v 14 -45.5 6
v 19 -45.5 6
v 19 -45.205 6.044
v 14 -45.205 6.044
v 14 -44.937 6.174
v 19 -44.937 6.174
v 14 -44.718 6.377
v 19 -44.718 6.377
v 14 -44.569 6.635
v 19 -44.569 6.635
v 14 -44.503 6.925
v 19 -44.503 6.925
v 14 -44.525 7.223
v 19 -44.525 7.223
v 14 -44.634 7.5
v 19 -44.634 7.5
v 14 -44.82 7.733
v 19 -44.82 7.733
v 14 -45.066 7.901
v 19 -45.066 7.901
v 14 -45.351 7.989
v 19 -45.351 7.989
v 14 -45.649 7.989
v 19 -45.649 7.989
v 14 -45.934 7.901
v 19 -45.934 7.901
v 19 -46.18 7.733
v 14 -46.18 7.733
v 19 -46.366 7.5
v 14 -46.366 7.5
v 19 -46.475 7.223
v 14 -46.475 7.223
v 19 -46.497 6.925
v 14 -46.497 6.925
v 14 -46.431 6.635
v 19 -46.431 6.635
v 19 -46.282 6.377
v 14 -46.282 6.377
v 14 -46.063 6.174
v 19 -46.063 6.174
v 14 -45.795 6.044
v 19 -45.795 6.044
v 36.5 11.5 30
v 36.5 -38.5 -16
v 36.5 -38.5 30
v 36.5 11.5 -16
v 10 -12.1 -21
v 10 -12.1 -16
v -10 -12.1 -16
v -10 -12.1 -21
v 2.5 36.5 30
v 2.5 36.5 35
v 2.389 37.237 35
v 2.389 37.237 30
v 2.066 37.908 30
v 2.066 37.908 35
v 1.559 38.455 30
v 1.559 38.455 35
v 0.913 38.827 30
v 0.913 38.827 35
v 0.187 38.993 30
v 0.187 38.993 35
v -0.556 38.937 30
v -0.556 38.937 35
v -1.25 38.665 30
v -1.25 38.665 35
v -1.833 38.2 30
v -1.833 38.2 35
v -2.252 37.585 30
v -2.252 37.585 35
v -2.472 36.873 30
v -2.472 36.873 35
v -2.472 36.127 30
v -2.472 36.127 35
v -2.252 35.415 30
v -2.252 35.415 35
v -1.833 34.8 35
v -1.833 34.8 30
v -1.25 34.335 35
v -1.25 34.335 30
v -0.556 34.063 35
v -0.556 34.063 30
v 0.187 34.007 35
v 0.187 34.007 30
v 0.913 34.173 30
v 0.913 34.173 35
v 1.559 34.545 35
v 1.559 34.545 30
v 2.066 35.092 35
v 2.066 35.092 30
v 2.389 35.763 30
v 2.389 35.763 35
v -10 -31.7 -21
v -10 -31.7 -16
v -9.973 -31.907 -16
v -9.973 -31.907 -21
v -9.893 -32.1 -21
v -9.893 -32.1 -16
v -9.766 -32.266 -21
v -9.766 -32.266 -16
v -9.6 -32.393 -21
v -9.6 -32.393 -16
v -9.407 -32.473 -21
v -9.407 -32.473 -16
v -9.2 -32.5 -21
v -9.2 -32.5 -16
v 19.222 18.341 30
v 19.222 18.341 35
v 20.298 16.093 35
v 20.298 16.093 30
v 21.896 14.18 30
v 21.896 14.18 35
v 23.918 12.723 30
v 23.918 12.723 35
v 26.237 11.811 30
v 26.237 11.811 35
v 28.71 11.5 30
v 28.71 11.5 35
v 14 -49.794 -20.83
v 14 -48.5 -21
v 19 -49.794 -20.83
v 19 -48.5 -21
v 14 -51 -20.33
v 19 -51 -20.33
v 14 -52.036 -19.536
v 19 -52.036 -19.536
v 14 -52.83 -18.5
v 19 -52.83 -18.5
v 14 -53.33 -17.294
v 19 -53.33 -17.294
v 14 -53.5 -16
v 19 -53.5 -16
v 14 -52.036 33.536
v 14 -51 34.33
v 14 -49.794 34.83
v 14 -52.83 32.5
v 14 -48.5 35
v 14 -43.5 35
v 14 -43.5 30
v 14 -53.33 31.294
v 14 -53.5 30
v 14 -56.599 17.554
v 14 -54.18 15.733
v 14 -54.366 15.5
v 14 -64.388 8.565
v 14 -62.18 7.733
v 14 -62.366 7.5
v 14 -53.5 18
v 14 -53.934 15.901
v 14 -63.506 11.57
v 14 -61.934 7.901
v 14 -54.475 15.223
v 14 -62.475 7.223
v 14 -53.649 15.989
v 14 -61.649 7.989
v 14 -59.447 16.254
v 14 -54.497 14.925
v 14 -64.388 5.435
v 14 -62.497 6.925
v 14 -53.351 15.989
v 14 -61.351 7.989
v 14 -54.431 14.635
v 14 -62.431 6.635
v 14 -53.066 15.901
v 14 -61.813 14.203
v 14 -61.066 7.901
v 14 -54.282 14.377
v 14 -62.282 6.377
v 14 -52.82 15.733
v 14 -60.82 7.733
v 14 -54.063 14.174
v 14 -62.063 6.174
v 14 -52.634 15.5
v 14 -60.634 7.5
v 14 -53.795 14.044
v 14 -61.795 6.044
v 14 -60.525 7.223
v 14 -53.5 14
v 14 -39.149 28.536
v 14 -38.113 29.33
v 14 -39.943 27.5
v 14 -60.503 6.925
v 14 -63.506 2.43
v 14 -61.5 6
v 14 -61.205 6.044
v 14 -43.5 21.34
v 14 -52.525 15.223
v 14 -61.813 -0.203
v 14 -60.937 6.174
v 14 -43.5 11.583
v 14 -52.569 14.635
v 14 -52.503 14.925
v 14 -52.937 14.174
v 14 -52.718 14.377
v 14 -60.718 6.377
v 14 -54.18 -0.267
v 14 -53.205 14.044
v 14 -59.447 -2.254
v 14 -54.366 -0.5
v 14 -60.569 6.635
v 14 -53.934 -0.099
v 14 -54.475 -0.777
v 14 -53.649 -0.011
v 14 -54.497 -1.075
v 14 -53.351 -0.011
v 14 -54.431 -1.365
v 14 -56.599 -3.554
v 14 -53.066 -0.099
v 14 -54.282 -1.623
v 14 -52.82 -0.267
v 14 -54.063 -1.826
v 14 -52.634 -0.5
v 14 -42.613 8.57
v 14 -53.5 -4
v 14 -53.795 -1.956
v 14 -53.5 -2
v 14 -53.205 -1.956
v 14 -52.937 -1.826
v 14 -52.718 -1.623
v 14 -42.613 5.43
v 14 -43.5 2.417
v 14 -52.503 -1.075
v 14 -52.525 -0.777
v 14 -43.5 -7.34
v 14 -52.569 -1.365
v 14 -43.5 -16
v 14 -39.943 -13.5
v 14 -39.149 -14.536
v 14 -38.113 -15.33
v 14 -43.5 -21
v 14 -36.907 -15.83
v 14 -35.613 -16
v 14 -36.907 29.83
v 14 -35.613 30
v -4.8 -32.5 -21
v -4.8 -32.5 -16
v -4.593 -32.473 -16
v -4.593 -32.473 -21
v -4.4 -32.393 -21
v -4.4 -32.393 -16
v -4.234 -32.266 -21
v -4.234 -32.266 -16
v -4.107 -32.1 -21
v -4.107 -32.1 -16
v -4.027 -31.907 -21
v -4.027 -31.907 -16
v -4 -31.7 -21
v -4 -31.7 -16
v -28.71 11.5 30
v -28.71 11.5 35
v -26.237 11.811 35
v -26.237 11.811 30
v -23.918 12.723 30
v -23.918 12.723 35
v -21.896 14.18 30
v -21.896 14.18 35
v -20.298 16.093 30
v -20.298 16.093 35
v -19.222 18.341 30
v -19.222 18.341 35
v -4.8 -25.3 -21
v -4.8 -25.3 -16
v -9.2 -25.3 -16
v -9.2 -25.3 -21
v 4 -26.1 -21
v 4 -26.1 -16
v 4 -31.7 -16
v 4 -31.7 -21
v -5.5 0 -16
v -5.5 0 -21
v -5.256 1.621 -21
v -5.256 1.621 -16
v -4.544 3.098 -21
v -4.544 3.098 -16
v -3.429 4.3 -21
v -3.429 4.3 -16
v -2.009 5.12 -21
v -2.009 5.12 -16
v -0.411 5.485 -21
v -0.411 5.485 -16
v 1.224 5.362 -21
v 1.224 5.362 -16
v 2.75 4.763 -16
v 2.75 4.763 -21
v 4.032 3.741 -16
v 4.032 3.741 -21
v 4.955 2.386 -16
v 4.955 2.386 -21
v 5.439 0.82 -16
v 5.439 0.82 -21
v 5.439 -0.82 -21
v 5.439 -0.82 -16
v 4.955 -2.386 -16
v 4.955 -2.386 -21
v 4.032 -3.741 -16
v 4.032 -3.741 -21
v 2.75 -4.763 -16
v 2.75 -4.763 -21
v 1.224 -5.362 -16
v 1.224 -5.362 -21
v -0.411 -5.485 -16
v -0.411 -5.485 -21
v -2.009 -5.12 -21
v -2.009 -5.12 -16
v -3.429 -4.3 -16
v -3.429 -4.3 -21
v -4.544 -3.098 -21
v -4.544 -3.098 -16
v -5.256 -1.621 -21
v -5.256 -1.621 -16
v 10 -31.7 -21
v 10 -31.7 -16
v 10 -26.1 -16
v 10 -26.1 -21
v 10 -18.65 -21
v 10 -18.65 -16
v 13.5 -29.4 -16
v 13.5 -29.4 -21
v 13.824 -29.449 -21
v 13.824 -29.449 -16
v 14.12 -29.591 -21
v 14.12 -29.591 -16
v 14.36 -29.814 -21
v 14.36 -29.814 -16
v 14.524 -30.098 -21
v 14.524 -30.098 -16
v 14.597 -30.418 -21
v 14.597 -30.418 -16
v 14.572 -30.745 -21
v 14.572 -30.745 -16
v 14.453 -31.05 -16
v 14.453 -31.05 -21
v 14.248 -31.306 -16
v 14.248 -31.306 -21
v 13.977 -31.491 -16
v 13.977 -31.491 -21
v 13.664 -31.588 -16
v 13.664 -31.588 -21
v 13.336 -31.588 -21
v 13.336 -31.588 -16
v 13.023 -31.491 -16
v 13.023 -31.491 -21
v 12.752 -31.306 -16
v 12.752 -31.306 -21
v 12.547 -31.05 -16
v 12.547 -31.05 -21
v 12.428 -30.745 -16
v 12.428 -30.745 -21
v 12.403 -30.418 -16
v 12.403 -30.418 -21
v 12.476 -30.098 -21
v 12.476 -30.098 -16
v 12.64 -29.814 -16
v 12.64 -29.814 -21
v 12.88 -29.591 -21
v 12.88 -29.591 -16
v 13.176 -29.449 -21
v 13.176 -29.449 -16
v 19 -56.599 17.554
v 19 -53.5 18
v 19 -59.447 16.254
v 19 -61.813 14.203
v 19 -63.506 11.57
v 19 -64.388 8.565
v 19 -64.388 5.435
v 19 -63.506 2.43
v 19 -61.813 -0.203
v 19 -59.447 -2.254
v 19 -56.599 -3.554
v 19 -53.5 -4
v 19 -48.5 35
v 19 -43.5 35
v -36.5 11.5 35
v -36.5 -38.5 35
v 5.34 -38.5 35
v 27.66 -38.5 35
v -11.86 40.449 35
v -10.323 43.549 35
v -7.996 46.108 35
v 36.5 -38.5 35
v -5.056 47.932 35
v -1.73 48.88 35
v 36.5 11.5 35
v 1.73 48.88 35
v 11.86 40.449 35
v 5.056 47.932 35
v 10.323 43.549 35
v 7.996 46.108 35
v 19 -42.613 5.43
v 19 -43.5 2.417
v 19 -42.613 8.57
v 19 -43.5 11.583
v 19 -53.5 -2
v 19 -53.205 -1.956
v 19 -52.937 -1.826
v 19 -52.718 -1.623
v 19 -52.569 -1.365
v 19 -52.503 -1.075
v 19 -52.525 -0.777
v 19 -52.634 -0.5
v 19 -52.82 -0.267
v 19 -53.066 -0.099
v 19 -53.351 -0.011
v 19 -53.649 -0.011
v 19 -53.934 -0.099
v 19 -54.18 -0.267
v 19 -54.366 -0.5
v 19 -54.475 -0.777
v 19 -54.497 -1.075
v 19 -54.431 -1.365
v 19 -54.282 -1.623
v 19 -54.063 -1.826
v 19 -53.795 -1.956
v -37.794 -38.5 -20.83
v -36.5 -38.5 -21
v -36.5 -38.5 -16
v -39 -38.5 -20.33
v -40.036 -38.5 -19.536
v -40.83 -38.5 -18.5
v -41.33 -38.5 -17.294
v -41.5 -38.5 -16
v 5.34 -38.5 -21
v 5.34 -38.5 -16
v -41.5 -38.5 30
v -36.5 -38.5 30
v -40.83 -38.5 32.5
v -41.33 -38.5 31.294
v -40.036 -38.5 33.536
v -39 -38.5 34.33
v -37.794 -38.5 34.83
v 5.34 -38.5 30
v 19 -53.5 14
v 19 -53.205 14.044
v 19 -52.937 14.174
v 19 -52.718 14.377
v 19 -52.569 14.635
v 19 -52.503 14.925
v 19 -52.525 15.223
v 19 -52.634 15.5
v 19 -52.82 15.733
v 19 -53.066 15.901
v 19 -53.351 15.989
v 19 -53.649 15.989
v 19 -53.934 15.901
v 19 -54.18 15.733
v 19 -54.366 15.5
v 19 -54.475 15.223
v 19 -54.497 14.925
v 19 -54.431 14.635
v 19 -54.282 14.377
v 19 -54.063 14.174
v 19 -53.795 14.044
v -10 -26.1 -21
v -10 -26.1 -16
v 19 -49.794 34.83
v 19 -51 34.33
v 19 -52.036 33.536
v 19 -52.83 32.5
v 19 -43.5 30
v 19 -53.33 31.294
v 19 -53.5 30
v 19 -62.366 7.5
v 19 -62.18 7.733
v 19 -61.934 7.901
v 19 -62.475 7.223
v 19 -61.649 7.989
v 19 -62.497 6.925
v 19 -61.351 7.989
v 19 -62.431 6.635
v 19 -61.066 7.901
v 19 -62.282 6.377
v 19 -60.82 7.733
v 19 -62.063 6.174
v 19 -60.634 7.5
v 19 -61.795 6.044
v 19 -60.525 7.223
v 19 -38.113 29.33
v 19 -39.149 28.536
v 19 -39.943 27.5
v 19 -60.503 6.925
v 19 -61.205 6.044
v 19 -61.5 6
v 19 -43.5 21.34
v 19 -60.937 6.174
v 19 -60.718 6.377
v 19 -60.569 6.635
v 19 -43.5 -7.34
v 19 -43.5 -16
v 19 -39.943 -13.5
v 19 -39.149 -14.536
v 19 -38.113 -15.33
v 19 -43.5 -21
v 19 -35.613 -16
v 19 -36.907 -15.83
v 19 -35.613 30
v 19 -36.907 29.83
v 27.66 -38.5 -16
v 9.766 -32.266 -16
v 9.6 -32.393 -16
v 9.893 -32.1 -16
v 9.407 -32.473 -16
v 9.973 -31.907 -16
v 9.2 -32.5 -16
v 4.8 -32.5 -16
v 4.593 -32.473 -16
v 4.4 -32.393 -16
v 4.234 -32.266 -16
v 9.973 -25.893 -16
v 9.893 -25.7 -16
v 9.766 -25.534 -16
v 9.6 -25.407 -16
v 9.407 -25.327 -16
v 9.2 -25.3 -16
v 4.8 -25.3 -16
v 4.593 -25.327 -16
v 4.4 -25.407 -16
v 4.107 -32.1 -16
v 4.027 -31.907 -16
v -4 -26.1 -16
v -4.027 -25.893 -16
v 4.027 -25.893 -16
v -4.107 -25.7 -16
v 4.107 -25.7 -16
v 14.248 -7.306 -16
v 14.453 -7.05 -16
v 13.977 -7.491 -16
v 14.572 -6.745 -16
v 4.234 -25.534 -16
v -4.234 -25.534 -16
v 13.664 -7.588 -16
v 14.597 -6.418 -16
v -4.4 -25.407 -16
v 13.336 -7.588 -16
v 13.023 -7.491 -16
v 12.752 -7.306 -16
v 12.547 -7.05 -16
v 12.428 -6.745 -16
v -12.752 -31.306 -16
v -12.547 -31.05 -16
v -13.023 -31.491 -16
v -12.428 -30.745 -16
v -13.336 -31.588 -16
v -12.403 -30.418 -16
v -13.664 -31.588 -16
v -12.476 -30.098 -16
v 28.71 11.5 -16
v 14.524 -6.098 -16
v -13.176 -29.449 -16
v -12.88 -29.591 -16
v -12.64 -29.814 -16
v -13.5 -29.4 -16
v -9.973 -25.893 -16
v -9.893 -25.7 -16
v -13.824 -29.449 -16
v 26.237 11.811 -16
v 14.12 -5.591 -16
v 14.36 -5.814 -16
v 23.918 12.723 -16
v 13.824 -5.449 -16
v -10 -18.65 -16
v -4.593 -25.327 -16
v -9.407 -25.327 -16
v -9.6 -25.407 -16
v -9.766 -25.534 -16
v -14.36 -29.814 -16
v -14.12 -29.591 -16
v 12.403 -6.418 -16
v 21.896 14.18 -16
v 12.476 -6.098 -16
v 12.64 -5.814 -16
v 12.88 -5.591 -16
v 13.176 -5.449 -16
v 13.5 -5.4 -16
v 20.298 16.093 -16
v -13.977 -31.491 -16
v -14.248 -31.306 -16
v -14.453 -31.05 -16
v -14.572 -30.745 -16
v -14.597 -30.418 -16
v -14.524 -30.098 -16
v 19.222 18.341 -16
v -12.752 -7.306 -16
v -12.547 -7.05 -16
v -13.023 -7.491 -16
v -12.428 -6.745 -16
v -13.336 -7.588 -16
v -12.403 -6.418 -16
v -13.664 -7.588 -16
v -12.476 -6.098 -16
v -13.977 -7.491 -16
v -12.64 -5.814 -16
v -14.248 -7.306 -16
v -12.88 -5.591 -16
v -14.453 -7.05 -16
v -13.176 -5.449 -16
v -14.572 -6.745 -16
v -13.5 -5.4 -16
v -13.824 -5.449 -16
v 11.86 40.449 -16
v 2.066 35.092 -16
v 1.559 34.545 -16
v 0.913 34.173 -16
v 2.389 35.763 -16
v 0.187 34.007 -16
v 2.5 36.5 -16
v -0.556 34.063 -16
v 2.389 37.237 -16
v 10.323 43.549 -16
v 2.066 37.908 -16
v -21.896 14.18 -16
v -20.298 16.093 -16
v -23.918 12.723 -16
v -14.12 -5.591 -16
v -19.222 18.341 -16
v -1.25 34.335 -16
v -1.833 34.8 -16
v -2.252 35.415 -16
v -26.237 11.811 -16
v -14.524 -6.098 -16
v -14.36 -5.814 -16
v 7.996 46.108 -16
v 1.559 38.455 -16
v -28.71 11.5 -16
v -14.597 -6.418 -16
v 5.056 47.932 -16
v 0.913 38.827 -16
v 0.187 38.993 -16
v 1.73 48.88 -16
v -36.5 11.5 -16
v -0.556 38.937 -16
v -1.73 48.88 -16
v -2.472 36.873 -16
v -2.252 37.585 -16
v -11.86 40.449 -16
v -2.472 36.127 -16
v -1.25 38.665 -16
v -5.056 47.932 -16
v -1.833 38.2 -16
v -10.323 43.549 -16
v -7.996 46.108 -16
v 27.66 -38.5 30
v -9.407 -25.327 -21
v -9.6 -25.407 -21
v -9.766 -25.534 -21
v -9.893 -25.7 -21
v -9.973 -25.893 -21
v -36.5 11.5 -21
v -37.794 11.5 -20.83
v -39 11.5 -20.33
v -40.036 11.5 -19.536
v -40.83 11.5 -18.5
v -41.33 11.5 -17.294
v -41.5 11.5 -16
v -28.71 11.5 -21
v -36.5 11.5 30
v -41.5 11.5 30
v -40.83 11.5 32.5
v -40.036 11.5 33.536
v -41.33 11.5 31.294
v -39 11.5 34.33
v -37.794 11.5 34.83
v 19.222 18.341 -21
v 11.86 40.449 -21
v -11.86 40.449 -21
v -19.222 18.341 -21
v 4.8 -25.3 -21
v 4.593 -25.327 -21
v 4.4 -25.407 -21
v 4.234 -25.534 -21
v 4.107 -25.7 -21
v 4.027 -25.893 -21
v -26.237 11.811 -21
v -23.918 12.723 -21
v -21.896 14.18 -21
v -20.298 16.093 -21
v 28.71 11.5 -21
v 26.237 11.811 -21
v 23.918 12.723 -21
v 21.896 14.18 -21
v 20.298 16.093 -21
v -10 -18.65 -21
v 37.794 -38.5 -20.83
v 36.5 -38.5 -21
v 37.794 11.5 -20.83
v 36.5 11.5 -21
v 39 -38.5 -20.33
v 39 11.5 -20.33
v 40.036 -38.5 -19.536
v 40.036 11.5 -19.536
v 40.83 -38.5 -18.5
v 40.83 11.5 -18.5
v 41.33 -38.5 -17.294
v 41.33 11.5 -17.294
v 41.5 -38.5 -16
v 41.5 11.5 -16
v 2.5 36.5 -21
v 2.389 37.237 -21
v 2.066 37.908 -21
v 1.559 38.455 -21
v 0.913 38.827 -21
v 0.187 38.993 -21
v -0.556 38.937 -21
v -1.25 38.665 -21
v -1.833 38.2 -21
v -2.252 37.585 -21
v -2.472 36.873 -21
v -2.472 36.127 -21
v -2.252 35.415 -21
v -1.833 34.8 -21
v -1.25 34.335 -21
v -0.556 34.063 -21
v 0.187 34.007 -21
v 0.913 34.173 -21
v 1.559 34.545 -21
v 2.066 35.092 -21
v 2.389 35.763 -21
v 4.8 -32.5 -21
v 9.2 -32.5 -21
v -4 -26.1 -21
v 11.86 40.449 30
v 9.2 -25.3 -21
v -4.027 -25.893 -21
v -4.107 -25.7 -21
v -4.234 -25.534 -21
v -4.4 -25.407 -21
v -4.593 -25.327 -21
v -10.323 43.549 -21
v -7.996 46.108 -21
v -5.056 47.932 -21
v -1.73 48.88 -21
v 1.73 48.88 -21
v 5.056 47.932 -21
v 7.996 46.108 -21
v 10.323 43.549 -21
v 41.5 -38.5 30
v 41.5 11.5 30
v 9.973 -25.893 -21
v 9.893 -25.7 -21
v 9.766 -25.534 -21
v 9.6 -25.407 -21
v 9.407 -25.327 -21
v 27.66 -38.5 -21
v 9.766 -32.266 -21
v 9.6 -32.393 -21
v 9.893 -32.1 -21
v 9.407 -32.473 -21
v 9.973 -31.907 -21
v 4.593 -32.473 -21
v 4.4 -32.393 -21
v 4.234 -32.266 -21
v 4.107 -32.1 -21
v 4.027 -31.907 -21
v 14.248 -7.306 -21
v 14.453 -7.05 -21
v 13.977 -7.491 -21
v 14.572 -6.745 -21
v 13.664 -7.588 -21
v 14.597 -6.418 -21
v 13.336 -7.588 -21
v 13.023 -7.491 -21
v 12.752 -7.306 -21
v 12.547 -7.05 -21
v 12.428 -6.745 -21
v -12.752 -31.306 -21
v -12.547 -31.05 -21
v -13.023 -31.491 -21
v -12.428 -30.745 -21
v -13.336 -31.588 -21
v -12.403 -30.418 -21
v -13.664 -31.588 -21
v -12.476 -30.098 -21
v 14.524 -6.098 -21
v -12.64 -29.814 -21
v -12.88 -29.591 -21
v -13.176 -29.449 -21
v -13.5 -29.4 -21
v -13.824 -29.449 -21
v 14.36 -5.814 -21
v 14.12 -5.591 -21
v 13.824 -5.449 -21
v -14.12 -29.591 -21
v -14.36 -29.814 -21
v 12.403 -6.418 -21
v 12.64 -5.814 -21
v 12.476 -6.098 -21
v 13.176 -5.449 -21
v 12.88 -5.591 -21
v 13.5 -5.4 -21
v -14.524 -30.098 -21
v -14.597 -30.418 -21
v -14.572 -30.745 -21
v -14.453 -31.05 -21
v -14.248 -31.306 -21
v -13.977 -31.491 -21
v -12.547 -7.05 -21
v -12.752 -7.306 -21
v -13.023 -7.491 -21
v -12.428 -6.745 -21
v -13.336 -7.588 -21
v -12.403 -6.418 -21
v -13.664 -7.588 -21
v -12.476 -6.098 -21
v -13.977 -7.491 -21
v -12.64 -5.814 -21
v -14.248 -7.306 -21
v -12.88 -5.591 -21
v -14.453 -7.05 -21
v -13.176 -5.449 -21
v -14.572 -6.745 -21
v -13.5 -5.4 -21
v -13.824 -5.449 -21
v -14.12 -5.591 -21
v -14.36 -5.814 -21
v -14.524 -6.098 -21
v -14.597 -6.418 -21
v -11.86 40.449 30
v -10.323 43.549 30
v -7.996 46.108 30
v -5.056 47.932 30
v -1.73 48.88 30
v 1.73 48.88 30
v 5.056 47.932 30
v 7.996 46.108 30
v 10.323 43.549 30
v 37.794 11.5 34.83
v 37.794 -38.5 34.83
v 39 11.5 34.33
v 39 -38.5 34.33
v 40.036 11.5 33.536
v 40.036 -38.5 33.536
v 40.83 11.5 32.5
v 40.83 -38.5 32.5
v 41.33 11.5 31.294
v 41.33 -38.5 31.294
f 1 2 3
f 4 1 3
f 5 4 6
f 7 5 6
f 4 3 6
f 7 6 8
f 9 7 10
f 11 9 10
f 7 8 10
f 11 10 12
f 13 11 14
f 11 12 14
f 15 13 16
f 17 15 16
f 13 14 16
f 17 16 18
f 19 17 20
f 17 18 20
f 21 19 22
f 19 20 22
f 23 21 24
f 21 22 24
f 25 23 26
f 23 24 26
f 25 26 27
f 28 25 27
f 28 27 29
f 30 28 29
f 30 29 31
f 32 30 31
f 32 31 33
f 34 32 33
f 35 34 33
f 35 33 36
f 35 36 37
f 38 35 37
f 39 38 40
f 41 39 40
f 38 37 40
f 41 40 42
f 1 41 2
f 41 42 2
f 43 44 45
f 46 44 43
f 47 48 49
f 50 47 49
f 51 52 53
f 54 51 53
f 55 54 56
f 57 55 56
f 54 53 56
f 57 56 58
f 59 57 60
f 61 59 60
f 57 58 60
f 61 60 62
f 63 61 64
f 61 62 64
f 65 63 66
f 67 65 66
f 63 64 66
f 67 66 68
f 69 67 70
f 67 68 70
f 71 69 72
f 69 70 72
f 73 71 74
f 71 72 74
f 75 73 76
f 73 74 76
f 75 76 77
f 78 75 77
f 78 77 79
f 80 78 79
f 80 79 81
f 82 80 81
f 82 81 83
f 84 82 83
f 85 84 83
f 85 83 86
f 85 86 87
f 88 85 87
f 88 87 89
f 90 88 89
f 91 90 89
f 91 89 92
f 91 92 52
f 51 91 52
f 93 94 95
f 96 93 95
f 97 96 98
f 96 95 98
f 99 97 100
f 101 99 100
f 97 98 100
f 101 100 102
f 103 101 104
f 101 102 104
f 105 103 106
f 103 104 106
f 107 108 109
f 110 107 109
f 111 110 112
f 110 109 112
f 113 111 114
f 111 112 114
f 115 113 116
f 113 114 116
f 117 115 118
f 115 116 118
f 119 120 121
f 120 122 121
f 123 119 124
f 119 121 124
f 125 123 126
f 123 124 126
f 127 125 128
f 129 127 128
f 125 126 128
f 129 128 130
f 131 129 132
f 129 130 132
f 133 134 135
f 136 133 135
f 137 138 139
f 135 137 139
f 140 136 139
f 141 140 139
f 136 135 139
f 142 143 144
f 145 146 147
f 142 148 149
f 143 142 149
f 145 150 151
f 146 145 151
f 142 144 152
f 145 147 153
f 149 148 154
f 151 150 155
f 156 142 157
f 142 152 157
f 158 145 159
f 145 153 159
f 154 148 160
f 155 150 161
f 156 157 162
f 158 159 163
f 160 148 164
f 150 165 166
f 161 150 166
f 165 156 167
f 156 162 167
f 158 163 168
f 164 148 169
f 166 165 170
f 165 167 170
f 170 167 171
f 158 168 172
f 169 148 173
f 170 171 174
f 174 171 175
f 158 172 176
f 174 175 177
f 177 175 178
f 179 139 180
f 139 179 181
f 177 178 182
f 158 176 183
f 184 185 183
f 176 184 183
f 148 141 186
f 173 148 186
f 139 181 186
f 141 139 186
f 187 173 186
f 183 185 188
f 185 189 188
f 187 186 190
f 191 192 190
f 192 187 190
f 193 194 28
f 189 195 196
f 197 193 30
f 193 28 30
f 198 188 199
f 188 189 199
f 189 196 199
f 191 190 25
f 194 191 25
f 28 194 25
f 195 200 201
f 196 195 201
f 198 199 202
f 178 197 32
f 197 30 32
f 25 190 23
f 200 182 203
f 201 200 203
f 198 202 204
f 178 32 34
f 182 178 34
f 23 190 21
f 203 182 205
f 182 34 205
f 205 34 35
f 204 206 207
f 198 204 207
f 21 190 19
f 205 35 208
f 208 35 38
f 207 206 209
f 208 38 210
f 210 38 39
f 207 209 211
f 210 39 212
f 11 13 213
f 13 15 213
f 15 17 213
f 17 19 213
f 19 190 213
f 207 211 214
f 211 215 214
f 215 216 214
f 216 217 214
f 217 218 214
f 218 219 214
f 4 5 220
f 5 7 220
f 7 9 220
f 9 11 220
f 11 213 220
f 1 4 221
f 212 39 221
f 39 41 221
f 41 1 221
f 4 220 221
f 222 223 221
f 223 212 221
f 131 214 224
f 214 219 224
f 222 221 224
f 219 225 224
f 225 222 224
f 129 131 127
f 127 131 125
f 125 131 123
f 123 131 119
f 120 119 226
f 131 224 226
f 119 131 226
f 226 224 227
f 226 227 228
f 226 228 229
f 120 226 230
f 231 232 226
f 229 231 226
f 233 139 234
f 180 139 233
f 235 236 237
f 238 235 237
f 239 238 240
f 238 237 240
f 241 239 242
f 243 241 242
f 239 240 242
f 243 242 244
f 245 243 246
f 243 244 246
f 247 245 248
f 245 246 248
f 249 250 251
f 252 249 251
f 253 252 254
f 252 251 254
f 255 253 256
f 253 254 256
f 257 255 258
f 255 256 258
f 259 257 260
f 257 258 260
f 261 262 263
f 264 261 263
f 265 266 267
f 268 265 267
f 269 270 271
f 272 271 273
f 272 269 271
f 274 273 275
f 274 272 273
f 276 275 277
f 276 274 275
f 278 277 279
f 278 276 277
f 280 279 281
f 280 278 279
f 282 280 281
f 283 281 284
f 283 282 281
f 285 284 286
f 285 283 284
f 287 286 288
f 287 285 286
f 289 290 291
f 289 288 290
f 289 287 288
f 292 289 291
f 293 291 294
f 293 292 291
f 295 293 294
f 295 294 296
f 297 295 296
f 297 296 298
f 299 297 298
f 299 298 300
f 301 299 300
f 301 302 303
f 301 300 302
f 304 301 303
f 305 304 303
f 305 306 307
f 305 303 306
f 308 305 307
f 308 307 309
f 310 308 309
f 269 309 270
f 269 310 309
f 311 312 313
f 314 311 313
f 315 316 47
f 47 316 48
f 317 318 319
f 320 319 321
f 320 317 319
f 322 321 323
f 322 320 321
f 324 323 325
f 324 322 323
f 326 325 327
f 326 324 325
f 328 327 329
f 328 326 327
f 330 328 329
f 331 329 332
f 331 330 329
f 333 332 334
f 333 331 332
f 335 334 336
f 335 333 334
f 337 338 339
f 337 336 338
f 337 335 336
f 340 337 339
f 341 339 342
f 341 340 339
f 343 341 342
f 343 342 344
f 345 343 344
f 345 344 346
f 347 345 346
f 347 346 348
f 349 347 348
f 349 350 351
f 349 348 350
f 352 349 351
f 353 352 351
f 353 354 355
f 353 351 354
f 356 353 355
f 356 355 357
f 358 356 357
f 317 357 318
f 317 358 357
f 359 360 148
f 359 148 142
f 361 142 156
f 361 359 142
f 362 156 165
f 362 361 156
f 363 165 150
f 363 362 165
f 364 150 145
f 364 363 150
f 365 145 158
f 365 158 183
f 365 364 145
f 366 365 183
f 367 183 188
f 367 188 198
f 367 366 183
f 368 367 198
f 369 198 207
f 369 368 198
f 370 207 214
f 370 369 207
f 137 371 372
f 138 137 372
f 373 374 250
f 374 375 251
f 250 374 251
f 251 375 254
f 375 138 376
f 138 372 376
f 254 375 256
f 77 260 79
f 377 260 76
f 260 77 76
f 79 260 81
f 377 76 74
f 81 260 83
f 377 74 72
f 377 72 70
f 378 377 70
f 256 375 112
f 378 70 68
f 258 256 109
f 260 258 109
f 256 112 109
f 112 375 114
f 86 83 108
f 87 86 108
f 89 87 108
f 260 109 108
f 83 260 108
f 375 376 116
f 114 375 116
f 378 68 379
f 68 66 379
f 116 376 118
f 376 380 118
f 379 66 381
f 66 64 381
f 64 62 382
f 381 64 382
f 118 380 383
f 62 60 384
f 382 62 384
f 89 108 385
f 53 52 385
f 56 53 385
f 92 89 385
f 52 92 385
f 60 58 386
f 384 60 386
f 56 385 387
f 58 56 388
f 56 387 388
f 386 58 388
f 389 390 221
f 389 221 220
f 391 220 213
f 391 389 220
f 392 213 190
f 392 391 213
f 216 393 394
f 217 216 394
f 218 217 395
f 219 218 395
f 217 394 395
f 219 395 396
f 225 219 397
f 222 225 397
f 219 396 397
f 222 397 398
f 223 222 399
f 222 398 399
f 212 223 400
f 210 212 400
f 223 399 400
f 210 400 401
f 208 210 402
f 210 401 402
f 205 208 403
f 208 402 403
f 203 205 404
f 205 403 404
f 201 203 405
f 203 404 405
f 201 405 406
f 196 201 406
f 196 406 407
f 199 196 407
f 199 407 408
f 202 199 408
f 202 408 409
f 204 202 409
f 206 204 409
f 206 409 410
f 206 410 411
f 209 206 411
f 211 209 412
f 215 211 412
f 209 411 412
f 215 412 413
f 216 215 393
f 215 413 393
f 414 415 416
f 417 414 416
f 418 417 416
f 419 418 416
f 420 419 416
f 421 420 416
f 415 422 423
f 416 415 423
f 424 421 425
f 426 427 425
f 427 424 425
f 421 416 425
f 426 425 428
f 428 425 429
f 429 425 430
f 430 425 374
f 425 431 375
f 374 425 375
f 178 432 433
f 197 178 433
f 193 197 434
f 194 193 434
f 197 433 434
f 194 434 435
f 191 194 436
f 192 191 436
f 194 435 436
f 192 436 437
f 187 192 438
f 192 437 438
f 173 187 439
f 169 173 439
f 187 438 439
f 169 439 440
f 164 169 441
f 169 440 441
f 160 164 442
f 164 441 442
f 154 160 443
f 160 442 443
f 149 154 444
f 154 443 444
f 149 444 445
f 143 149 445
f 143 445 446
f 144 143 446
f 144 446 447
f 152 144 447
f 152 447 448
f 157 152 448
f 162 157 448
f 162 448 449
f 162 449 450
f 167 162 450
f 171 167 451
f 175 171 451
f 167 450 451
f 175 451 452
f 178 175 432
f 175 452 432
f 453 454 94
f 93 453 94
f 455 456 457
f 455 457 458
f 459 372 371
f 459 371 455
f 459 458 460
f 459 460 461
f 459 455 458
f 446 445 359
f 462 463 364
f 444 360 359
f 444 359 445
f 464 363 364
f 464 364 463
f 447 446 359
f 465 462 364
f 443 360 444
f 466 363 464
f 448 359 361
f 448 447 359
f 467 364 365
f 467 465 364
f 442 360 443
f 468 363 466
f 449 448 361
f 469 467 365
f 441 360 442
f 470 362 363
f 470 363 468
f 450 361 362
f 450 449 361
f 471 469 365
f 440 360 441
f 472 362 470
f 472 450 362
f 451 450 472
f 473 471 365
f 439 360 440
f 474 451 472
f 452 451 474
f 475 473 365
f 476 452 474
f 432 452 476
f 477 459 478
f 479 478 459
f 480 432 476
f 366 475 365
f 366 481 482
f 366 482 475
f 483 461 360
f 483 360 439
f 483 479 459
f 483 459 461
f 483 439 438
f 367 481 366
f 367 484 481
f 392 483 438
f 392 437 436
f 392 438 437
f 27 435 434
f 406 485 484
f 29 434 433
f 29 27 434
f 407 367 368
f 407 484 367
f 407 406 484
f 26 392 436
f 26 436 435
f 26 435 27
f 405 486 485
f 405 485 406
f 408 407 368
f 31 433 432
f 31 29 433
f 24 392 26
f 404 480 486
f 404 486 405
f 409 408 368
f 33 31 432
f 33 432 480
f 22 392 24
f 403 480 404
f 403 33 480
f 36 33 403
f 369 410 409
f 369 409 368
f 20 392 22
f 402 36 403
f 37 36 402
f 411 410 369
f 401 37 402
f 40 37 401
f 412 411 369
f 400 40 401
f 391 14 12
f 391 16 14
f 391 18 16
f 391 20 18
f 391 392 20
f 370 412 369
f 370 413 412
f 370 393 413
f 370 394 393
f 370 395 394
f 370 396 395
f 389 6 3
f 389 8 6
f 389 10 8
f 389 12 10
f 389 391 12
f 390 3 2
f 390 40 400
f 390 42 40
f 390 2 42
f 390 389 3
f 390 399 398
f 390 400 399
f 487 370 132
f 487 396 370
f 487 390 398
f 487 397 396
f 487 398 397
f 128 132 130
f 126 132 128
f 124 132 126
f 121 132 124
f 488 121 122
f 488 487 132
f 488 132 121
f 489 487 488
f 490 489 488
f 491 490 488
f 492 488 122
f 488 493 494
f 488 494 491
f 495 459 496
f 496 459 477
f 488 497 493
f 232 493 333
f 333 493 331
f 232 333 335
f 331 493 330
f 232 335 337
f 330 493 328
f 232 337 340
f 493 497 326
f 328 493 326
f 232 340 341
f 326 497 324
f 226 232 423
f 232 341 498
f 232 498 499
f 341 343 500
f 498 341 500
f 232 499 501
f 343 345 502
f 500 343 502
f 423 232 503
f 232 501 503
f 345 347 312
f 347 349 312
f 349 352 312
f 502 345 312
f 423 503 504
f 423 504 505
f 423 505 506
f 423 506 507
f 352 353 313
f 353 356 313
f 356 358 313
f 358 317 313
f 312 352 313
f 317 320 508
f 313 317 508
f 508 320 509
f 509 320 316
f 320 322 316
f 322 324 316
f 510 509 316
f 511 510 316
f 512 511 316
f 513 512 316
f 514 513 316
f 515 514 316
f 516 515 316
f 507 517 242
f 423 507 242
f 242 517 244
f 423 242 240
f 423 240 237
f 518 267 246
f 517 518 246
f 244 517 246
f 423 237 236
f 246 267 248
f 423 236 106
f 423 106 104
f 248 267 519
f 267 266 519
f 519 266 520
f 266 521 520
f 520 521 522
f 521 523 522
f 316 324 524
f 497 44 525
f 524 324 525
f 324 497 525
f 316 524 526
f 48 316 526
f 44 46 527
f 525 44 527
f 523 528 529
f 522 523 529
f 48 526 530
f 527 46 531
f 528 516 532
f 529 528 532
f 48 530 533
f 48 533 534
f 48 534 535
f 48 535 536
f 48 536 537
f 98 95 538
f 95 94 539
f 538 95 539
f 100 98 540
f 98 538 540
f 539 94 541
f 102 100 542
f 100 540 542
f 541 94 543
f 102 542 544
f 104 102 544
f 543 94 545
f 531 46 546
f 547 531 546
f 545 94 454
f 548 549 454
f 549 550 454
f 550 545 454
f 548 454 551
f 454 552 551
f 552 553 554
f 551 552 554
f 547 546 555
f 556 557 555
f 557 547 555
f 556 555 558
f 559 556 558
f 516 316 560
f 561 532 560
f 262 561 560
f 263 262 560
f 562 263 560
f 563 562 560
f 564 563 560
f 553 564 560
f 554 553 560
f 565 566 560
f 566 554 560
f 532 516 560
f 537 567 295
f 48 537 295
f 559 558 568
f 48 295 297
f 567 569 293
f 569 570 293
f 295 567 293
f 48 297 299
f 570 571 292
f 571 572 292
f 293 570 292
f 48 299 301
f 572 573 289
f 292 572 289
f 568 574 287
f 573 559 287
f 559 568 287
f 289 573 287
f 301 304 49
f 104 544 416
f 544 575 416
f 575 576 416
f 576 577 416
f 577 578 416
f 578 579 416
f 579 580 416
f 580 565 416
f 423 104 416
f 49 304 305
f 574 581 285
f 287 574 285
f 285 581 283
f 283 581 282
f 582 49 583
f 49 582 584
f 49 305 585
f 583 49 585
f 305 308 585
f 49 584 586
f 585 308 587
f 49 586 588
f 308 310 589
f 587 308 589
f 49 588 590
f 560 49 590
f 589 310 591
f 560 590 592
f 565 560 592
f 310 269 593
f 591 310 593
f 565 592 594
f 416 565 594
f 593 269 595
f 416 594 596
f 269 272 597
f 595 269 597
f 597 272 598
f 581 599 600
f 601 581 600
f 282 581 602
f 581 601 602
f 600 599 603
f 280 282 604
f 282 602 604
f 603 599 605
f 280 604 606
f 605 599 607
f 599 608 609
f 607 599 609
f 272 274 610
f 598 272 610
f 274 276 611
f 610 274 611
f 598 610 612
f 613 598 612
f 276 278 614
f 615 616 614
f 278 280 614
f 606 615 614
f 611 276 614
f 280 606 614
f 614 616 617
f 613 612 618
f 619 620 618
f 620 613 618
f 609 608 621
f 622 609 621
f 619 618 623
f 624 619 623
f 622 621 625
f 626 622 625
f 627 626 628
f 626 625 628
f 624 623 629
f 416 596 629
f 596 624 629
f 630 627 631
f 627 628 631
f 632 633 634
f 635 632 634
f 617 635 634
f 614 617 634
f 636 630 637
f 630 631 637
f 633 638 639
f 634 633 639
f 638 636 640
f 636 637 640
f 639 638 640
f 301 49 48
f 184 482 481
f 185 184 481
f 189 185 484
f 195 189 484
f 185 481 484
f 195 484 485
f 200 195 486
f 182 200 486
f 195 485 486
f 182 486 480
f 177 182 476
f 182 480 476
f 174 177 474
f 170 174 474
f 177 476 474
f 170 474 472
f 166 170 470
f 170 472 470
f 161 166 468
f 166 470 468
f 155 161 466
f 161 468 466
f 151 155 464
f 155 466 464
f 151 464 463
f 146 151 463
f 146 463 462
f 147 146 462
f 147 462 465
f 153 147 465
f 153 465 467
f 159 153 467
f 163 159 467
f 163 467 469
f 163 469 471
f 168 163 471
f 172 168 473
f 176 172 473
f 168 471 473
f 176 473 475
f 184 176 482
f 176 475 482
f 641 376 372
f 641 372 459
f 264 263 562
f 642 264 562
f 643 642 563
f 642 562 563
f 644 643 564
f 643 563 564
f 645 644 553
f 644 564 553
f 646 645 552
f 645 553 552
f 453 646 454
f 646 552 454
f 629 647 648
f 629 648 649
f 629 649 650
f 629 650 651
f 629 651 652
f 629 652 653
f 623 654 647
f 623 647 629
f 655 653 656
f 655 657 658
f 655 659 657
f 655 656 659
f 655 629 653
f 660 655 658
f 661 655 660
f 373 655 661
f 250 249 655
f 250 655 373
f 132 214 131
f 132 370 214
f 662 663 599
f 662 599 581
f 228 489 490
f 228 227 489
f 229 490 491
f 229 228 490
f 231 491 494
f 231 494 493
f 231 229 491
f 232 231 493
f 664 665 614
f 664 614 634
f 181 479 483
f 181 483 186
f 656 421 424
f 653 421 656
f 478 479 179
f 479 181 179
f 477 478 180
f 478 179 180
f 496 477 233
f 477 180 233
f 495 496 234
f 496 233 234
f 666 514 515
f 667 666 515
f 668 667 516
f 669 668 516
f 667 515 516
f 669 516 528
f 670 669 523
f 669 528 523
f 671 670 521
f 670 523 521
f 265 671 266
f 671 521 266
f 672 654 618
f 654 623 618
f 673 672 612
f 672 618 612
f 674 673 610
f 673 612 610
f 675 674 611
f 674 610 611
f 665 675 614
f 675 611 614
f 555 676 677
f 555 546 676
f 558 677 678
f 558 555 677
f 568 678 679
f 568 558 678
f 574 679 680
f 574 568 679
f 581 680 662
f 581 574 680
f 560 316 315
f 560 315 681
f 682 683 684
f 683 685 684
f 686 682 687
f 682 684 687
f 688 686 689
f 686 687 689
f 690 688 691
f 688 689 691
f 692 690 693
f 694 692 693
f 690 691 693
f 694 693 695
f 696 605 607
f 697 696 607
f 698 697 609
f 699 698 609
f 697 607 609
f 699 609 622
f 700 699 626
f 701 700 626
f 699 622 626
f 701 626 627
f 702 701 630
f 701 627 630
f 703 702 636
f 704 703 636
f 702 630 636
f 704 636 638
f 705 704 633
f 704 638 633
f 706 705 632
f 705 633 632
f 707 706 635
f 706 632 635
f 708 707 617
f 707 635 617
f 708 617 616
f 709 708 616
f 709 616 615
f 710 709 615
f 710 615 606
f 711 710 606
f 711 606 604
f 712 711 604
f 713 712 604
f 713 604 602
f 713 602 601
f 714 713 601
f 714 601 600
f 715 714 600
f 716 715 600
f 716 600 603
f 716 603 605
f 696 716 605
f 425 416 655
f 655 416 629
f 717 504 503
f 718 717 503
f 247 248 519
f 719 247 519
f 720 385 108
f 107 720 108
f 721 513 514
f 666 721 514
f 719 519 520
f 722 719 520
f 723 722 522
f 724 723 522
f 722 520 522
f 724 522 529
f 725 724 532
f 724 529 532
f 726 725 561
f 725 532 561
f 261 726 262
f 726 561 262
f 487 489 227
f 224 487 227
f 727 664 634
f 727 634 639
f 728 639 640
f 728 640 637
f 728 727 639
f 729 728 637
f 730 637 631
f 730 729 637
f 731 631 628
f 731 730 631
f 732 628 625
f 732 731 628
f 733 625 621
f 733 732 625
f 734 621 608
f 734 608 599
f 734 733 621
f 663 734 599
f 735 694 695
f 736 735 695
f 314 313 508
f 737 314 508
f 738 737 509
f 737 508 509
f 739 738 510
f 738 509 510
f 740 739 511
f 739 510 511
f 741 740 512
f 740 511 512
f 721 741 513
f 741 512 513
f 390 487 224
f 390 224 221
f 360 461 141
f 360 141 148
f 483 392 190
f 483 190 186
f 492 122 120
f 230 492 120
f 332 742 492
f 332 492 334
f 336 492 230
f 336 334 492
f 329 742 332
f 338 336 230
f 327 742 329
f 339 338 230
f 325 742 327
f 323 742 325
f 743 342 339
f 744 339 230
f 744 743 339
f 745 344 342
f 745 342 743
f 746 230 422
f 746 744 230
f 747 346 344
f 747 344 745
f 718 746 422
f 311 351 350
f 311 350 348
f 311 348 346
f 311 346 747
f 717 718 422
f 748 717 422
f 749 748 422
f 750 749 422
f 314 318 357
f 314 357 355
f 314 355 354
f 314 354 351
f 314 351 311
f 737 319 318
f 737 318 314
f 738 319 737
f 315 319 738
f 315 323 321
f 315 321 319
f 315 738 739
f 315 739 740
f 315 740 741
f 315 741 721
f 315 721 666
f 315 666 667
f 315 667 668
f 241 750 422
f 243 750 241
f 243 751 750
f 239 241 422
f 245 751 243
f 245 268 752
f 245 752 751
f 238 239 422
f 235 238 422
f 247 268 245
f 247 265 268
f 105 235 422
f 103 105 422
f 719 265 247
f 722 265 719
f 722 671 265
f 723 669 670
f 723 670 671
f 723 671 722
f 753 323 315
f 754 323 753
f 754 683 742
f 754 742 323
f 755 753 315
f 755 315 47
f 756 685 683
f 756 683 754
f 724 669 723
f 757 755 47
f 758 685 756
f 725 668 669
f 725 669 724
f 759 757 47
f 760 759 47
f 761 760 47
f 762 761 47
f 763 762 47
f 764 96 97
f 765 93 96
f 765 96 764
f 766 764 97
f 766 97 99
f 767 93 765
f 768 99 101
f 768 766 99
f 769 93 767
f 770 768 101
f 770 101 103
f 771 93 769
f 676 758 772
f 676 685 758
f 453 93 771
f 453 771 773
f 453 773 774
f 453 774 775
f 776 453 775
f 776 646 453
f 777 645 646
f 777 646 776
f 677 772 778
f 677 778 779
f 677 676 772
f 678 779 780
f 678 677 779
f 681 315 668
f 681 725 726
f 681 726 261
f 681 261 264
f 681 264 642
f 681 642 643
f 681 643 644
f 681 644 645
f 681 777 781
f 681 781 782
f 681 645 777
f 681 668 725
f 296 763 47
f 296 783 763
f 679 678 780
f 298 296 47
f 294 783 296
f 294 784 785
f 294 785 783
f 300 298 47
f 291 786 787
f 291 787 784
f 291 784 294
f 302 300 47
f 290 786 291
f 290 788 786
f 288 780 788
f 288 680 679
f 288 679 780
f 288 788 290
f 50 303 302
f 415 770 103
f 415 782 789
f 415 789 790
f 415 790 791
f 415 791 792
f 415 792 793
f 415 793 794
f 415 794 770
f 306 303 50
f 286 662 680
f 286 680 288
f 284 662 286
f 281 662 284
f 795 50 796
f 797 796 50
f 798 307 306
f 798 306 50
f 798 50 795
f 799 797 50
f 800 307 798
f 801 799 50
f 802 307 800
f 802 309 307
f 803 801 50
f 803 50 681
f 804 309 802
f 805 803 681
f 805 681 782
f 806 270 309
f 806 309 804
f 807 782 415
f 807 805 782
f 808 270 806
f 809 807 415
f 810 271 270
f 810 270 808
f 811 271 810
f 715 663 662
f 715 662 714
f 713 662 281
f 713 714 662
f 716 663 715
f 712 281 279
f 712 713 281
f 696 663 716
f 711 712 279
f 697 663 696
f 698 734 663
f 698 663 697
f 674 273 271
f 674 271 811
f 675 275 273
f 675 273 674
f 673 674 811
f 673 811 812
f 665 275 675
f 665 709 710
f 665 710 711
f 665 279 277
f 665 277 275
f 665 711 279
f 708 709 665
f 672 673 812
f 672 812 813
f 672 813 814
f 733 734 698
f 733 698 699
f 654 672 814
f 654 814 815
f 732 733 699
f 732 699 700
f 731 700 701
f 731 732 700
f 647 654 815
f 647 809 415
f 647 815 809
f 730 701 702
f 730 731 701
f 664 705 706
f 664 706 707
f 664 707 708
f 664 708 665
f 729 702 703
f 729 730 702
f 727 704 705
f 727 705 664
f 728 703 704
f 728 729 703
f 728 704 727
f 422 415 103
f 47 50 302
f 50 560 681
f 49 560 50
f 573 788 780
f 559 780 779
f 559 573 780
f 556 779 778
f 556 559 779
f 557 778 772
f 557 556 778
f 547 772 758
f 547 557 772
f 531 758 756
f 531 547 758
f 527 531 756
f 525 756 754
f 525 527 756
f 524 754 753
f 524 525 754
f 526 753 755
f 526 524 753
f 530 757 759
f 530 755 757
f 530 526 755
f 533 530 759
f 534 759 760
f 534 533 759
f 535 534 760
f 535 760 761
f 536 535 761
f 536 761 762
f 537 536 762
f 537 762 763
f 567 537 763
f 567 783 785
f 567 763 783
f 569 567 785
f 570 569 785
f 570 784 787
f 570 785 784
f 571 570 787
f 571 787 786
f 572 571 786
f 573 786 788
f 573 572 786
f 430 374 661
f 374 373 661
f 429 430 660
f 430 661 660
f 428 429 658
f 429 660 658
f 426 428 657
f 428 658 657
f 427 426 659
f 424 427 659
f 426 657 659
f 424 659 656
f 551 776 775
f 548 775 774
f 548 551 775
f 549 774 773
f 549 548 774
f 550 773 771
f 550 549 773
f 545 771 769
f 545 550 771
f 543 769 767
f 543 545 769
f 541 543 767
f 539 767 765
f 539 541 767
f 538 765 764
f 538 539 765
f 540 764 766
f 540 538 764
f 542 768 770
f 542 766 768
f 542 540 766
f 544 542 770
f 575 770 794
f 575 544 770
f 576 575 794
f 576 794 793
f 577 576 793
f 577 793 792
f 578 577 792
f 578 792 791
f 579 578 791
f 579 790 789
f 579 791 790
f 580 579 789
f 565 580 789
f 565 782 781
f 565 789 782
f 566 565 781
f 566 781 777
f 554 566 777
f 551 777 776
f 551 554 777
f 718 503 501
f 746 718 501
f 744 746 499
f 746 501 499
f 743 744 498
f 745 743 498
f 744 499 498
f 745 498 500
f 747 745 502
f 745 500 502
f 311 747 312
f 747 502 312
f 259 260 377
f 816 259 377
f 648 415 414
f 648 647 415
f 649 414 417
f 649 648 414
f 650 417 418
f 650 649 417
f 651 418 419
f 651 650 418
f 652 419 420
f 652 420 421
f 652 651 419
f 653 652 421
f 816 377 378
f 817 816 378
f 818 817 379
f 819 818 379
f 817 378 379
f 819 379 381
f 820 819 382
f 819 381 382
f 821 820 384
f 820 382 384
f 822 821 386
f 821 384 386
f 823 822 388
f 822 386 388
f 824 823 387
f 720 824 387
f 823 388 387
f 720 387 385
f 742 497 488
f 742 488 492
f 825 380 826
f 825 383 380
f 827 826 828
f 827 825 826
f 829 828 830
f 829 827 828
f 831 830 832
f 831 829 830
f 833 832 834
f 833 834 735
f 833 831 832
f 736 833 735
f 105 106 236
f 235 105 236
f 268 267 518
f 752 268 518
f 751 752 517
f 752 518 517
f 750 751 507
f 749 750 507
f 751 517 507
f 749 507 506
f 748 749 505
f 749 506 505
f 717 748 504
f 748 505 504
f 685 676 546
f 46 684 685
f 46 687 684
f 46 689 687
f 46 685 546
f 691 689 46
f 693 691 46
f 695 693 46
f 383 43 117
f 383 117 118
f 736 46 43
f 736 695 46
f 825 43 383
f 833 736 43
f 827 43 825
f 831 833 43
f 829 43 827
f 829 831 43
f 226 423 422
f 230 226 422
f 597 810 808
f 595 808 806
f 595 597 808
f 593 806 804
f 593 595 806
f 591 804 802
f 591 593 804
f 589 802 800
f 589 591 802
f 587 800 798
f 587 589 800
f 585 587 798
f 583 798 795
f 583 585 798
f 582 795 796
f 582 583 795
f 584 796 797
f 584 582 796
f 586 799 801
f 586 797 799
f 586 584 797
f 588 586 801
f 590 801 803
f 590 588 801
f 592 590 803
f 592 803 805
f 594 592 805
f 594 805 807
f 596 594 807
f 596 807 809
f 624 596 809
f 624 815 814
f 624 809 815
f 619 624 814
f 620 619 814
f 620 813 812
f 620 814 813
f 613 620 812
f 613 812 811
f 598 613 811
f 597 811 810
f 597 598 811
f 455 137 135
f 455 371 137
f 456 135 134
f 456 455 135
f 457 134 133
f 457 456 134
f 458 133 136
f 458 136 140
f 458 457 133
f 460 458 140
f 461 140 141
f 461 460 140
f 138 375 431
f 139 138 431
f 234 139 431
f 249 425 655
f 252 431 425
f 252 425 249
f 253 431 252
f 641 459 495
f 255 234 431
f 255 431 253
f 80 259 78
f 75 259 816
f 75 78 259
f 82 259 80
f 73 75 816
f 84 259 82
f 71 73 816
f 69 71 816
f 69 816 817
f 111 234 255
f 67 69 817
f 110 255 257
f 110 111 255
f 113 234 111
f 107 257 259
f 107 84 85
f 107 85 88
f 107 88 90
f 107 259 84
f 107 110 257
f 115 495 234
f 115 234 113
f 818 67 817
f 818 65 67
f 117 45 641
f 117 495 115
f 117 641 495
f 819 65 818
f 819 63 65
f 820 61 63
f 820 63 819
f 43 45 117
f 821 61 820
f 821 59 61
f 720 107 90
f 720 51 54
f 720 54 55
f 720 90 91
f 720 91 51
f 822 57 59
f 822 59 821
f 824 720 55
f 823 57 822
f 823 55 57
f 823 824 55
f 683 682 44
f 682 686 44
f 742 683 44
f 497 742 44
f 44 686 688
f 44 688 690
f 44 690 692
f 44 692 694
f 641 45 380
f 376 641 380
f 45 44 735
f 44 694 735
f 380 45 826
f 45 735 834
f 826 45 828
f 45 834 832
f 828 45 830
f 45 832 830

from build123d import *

# Parameters (mm, degrees)
SKETCH3_W             = 32
SKETCH3_H             = 50
BOSS_EXTRUDE1_DEPTH   = 5
CUT_W                 = 20
CUT_H                 = 6.55
CUT_EXTRUDE1_DEPTH    = 10
SKETCH4_W             = 25.5
SKETCH4_H             = 50
BOSS_EXTRUDE2_DEPTH   = 5
SKETCH5_W             = 5
SKETCH5_H             = 50
BOSS_EXTRUDE3_DEPTH   = 51
BOSS_EXTRUDE4_REACH   = 80
SKETCH6_W             = 5
SKETCH6_H             = 50
BOSS_EXTRUDE5_DEPTH   = 5
FILLET1_R             = 10
BOSS_EXTRUDE6_DEPTH   = 5
SKETCH9_W             = 5
SKETCH9_H             = 15
BOSS_EXTRUDE7_DEPTH   = 2.5
BOSS_EXTRUDE8_DEPTH   = 5
SKETCH11_R            = 1
CUT_EXTRUDE2_DEPTH    = 5
FILLET4_R             = 5
FILLET5_R             = 5
CHAMFER1_SIZE         = 5
CHAMFER1_SIZE2        = 8.660254038
CHAMFER1_PART_2_SIZE  = 5
CHAMFER1_PART_2_SIZE2 = 8.660254038
FILLET6_R             = 5
CHAMFER2_SIZE         = 5
CHAMFER2_SIZE2        = 8.660254038
CHAMFER2_PART_2_SIZE  = 5
CHAMFER2_PART_2_SIZE2 = 8.660254038
SKETCH12_R            = 2.5
CUT_EXTRUDE3_DEPTH    = 57


with BuildPart() as part:
    # Sketch3 → Boss-Extrude1 (new body)
    with BuildSketch(Plane(origin=(0, 0, -16), x_dir=(-1, 0, 0), z_dir=(0, 0, -1))):
        with Locations((0, -13.5)):
            Rectangle(SKETCH3_W, SKETCH3_H)
    extrude(amount=BOSS_EXTRUDE1_DEPTH)

    # Cut → Cut-Extrude1 (cut)
    with BuildSketch(Plane(origin=(0, 0, -16), x_dir=(-1, 0, 0), z_dir=(0, 0, -1))):
        with BuildLine():
            Line((9.2, -32.5), (4.8, -32.5))
            ThreePointArc((4.8, -32.5), (4.234314575, -32.265685425), (4, -31.7))
            Line((4, -31.7), (4, -26.1))
            ThreePointArc((4, -26.1), (4.234314575, -25.534314575), (4.8, -25.3))
            Line((4.8, -25.3), (9.2, -25.3))
            ThreePointArc((9.2, -25.3), (9.765685425, -25.534314575), (10, -26.1))
            Line((10, -26.1), (10, -31.7))
            ThreePointArc((10, -31.7), (9.765685425, -32.265685425), (9.2, -32.5))
        make_face()
        with BuildLine():
            Line((-10, -31.7), (-10, -26.1))
            ThreePointArc((-10, -26.1), (-9.765685425, -25.534314575), (-9.2, -25.3))
            Line((-9.2, -25.3), (-4.8, -25.3))
            ThreePointArc((-4.8, -25.3), (-4.234314575, -25.534314575), (-4, -26.1))
            Line((-4, -26.1), (-4, -31.7))
            ThreePointArc((-4, -31.7), (-4.234314575, -32.265685425), (-4.8, -32.5))
            Line((-4.8, -32.5), (-9.2, -32.5))
            ThreePointArc((-9.2, -32.5), (-9.765685425, -32.265685425), (-10, -31.7))
        make_face()
        with Locations((0, -15.375)):
            Rectangle(CUT_W, CUT_H)
        with BuildLine():
            ThreePointArc((-5.5, 0), (0, -5.5), (5.5, 0))
            ThreePointArc((5.5, 0), (0, 5.5), (-5.5, 0))
        make_face()
        with BuildLine():
            ThreePointArc((13.5, -7.6), (14.6, -6.500000002), (13.500000003, -5.4))
            ThreePointArc((13.500000003, -5.4), (12.4, -6.499999998), (13.5, -7.6))
        make_face()
        with BuildLine():
            ThreePointArc((13.5, -31.6), (14.6, -30.500000002), (13.500000003, -29.4))
            ThreePointArc((13.500000003, -29.4), (12.4, -30.499999998), (13.5, -31.6))
        make_face()
        with BuildLine():
            ThreePointArc((-13.5, -31.6), (-12.4, -30.499999998), (-13.500000003, -29.4))
            ThreePointArc((-13.500000003, -29.4), (-14.6, -30.500000002), (-13.5, -31.6))
        make_face()
        with BuildLine():
            ThreePointArc((-13.5, -7.6), (-12.4, -6.499999998), (-13.500000003, -5.4))
            ThreePointArc((-13.500000003, -5.4), (-14.6, -6.500000002), (-13.5, -7.6))
        make_face()
    extrude(amount=CUT_EXTRUDE1_DEPTH, mode=Mode.SUBTRACT)

    # Sketch4 → Boss-Extrude2 (add)
    with BuildSketch(Plane(origin=(0, 0, -21), x_dir=(-1, 0, 0), z_dir=(0, 0, -1))):
        with Locations((-28.75, -13.5)):
            Rectangle(SKETCH4_W, SKETCH4_H)
        with Locations((28.75, -13.5)):
            Rectangle(SKETCH4_W, SKETCH4_H)
    extrude(amount=-BOSS_EXTRUDE2_DEPTH)

    # Sketch5 → Boss-Extrude3 (add)
    with BuildSketch(Plane.XY.offset(-16)):
        with Locations((-39, -13.5)):
            Rectangle(SKETCH5_W, SKETCH5_H)
        with Locations((39, -13.5)):
            Rectangle(SKETCH5_W, SKETCH5_H)
    extrude(amount=BOSS_EXTRUDE3_DEPTH)

    # Sketch6 → Boss-Extrude4 (add, up to next)
    with BuildSketch(Plane.ZY.offset(-36.5), mode=Mode.PRIVATE) as boss_extrude4_sk1:
        with Locations((32.5, -13.5)):
            Rectangle(SKETCH6_W, SKETCH6_H)
    boss_extrude4_tool1 = extrude(boss_extrude4_sk1.sketch, amount=BOSS_EXTRUDE4_REACH, mode=Mode.PRIVATE) - part.part
    add(boss_extrude4_tool1.solids().sort_by_distance((36.5, -13.5, 32.5))[0])

    # Sketch7 → Boss-Extrude5 (add)
    with BuildSketch(Plane(origin=(0, 0, -21), x_dir=(-1, 0, 0), z_dir=(0, 0, -1))):
        with BuildLine():
            Line((-11.859707003, 40.449348023), (-21.5, 11.5))
            Line((-21.5, 11.5), (21.5, 11.5))
            Line((21.5, 11.5), (11.859707003, 40.449348023))
            ThreePointArc((11.859707003, 40.449348023), (0, 49), (-11.859707003, 40.449348023))
        make_face()
    extrude(amount=-BOSS_EXTRUDE5_DEPTH)

    # Fillet1
    fillet1_edges = [part.edges().sort_by_distance(p)[0] for p in [
        (-21.5, 11.5, -18.5),
        (21.5, 11.5, -18.5),
    ]]
    fillet(fillet1_edges, radius=FILLET1_R)

    # Sketch8 → Boss-Extrude6 (add)
    with BuildSketch(Plane.XY.offset(35)):
        with BuildLine():
            Line((11.859707003, 40.449348023), (19.222068481, 18.340521582))
            ThreePointArc((19.222068481, 18.340521582), (22.86153451, 13.388440835), (28.709834084, 11.5))
            Line((28.709834084, 11.5), (-28.709834084, 11.5))
            ThreePointArc((-28.709834084, 11.5), (-22.86153451, 13.388440835), (-19.222068481, 18.340521582))
            Line((-19.222068481, 18.340521582), (-11.859707003, 40.449348023))
            ThreePointArc((-11.859707003, 40.449348023), (0, 49), (11.859707003, 40.449348023))
        make_face()
    extrude(amount=-BOSS_EXTRUDE6_DEPTH)

    # Sketch9 → Boss-Extrude7 (add, symmetric)
    with BuildSketch(Plane(origin=(16.5, 0, 0), x_dir=(0, 0, -1), z_dir=(1, 0, 0))):
        with Locations((-32.5, -46)):
            Rectangle(SKETCH9_W, SKETCH9_H)
        with Locations((18.5, -46)):
            Rectangle(SKETCH9_W, SKETCH9_H)
    extrude(amount=BOSS_EXTRUDE7_DEPTH, both=True)

    # Sketch10 → Boss-Extrude8 (add)
    with BuildSketch(Plane(origin=(19, 0, 0), x_dir=(0, 0, -1), z_dir=(1, 0, 0))):
        with BuildLine():
            Line((-30, -53.5), (-18, -53.5))
            ThreePointArc((-18, -53.5), (-7, -64.5), (4, -53.5))
            Line((4, -53.5), (16, -53.5))
            Line((16, -53.5), (16, -43.5))
            Line((16, -43.5), (-2.417424305, -43.5))
            ThreePointArc((-2.417424305, -43.5), (-7, -42.5), (-11.582575695, -43.5))
            Line((-11.582575695, -43.5), (-30, -43.5))
            Line((-30, -43.5), (-30, -53.5))
        make_face()
    extrude(amount=-BOSS_EXTRUDE8_DEPTH)

    # Sketch11 → Cut-Extrude2 (cut)
    with BuildSketch(Plane(origin=(19, 0, 0), x_dir=(0, 0, -1), z_dir=(1, 0, 0))):
        with Locations((-15, -53.5)):
            Circle(SKETCH11_R)
        with Locations((-7, -45.5)):
            Circle(SKETCH11_R)
        with Locations((1, -53.5)):
            Circle(SKETCH11_R)
        with Locations((-7, -61.5)):
            Circle(SKETCH11_R)
    extrude(amount=-CUT_EXTRUDE2_DEPTH, mode=Mode.SUBTRACT)

    # Fillet4
    fillet4_edges = [part.edges().sort_by_distance(p)[0] for p in [
        (41.5, -13.5, -21),
        (-41.5, -13.5, -21),
        (-41.5, -13.5, 35),
        (41.5, -13.5, 35),
    ]]
    fillet(fillet4_edges, radius=FILLET4_R)

    # Fillet5
    fillet5_edges = [part.edges().sort_by_distance(p)[0] for p in [
        (16.5, -53.5, 35),
        (16.5, -53.5, -21),
    ]]
    fillet(fillet5_edges, radius=FILLET5_R)

    # Chamfer1
    chamfer1_edges = [part.edges().sort_by_distance(p)[0] for p in [
        (16.5, -43.5, -16),
    ]]
    chamfer1_side = [part.faces().sort_by_distance(p)[0] for p in [
        (-22.17239609, 12.432609658, -16),
    ]]
    chamfer(chamfer1_edges, length=CHAMFER1_SIZE, length2=CHAMFER1_SIZE2, reference=chamfer1_side[0])

    # Chamfer1 part 2
    chamfer1_part_2_edges = [part.edges().sort_by_distance(p)[0] for p in [
        (16.5, -43.5, 30),
    ]]
    chamfer1_part_2_side = [part.faces().sort_by_distance(p)[0] for p in [
        (0.085787805, -4.114556323, 30),
    ]]
    chamfer(chamfer1_part_2_edges, length=CHAMFER1_PART_2_SIZE, length2=CHAMFER1_PART_2_SIZE2, reference=chamfer1_part_2_side[0])

    # Fillet6
    fillet6_edges = [part.edges().sort_by_distance(p)[0] for p in [
        (16.5, -38.5, -16),
        (16.5, -38.5, 30),
    ]]
    fillet(fillet6_edges, radius=FILLET6_R)

    # Chamfer2
    chamfer2_edges = [part.edges().sort_by_distance(p)[0] for p in [
        (14, -38.5, 32.5),
        (14, -38.5, -18.5),
    ]]
    chamfer2_side = [part.faces().sort_by_distance(p)[0] for p in [
        (14, -49.7166158, 7),
    ]]
    chamfer(chamfer2_edges, length=CHAMFER2_SIZE, length2=CHAMFER2_SIZE2, reference=chamfer2_side[0])

    # Chamfer2 part 2
    chamfer2_part_2_edges = [part.edges().sort_by_distance(p)[0] for p in [
        (19, -38.5, 32.5),
        (19, -38.5, -18.5),
    ]]
    chamfer2_part_2_side = [part.faces().sort_by_distance(p)[0] for p in [
        (19, -49.7166158, 7),
    ]]
    chamfer(chamfer2_part_2_edges, length=CHAMFER2_PART_2_SIZE, length2=CHAMFER2_PART_2_SIZE2, reference=chamfer2_part_2_side[0])

    # Sketch12 → Cut-Extrude3 (cut, through all)
    with BuildSketch(Plane.XY.offset(35)):
        with Locations((0, 36.5)):
            Circle(SKETCH12_R)
    extrude(amount=-CUT_EXTRUDE3_DEPTH, mode=Mode.SUBTRACT)


solid = part.part
